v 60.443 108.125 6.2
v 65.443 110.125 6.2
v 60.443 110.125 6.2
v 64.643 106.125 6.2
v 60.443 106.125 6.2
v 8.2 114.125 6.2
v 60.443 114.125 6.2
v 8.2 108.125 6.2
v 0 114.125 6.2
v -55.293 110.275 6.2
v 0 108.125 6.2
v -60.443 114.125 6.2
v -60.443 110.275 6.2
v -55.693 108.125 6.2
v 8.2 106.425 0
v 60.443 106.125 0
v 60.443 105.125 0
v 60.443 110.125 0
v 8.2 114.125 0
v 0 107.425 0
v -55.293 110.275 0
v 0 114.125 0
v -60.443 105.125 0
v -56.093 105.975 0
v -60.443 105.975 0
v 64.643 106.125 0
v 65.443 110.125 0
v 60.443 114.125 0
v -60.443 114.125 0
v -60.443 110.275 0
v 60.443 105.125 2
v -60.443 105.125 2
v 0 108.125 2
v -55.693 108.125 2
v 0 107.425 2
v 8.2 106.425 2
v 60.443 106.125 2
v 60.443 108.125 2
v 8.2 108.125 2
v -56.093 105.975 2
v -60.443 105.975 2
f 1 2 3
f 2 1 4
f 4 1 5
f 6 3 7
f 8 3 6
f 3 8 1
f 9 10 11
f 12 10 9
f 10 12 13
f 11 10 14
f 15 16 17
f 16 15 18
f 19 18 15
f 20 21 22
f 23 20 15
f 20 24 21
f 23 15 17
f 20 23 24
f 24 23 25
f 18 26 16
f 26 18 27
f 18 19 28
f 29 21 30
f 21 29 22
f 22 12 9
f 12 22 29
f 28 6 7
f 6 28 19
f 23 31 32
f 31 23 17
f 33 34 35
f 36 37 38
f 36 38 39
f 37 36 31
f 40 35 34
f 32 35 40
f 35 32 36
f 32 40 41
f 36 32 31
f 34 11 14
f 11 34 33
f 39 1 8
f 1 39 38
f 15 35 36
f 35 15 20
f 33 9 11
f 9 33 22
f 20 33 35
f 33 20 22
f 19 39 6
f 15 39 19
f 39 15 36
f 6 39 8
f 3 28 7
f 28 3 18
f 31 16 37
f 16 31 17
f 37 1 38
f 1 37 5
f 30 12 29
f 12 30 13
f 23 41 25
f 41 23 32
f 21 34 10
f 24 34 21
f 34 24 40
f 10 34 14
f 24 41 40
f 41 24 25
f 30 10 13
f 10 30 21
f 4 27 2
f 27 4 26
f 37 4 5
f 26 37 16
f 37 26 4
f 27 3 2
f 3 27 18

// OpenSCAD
// ============================================
// Plate 7: 프레임 - 상단 중앙 (TC)
// 크기: ~121 x ~114 mm (OK)
// ============================================
use <../src/model_a_frame.scad>

frame_seg_TC();
